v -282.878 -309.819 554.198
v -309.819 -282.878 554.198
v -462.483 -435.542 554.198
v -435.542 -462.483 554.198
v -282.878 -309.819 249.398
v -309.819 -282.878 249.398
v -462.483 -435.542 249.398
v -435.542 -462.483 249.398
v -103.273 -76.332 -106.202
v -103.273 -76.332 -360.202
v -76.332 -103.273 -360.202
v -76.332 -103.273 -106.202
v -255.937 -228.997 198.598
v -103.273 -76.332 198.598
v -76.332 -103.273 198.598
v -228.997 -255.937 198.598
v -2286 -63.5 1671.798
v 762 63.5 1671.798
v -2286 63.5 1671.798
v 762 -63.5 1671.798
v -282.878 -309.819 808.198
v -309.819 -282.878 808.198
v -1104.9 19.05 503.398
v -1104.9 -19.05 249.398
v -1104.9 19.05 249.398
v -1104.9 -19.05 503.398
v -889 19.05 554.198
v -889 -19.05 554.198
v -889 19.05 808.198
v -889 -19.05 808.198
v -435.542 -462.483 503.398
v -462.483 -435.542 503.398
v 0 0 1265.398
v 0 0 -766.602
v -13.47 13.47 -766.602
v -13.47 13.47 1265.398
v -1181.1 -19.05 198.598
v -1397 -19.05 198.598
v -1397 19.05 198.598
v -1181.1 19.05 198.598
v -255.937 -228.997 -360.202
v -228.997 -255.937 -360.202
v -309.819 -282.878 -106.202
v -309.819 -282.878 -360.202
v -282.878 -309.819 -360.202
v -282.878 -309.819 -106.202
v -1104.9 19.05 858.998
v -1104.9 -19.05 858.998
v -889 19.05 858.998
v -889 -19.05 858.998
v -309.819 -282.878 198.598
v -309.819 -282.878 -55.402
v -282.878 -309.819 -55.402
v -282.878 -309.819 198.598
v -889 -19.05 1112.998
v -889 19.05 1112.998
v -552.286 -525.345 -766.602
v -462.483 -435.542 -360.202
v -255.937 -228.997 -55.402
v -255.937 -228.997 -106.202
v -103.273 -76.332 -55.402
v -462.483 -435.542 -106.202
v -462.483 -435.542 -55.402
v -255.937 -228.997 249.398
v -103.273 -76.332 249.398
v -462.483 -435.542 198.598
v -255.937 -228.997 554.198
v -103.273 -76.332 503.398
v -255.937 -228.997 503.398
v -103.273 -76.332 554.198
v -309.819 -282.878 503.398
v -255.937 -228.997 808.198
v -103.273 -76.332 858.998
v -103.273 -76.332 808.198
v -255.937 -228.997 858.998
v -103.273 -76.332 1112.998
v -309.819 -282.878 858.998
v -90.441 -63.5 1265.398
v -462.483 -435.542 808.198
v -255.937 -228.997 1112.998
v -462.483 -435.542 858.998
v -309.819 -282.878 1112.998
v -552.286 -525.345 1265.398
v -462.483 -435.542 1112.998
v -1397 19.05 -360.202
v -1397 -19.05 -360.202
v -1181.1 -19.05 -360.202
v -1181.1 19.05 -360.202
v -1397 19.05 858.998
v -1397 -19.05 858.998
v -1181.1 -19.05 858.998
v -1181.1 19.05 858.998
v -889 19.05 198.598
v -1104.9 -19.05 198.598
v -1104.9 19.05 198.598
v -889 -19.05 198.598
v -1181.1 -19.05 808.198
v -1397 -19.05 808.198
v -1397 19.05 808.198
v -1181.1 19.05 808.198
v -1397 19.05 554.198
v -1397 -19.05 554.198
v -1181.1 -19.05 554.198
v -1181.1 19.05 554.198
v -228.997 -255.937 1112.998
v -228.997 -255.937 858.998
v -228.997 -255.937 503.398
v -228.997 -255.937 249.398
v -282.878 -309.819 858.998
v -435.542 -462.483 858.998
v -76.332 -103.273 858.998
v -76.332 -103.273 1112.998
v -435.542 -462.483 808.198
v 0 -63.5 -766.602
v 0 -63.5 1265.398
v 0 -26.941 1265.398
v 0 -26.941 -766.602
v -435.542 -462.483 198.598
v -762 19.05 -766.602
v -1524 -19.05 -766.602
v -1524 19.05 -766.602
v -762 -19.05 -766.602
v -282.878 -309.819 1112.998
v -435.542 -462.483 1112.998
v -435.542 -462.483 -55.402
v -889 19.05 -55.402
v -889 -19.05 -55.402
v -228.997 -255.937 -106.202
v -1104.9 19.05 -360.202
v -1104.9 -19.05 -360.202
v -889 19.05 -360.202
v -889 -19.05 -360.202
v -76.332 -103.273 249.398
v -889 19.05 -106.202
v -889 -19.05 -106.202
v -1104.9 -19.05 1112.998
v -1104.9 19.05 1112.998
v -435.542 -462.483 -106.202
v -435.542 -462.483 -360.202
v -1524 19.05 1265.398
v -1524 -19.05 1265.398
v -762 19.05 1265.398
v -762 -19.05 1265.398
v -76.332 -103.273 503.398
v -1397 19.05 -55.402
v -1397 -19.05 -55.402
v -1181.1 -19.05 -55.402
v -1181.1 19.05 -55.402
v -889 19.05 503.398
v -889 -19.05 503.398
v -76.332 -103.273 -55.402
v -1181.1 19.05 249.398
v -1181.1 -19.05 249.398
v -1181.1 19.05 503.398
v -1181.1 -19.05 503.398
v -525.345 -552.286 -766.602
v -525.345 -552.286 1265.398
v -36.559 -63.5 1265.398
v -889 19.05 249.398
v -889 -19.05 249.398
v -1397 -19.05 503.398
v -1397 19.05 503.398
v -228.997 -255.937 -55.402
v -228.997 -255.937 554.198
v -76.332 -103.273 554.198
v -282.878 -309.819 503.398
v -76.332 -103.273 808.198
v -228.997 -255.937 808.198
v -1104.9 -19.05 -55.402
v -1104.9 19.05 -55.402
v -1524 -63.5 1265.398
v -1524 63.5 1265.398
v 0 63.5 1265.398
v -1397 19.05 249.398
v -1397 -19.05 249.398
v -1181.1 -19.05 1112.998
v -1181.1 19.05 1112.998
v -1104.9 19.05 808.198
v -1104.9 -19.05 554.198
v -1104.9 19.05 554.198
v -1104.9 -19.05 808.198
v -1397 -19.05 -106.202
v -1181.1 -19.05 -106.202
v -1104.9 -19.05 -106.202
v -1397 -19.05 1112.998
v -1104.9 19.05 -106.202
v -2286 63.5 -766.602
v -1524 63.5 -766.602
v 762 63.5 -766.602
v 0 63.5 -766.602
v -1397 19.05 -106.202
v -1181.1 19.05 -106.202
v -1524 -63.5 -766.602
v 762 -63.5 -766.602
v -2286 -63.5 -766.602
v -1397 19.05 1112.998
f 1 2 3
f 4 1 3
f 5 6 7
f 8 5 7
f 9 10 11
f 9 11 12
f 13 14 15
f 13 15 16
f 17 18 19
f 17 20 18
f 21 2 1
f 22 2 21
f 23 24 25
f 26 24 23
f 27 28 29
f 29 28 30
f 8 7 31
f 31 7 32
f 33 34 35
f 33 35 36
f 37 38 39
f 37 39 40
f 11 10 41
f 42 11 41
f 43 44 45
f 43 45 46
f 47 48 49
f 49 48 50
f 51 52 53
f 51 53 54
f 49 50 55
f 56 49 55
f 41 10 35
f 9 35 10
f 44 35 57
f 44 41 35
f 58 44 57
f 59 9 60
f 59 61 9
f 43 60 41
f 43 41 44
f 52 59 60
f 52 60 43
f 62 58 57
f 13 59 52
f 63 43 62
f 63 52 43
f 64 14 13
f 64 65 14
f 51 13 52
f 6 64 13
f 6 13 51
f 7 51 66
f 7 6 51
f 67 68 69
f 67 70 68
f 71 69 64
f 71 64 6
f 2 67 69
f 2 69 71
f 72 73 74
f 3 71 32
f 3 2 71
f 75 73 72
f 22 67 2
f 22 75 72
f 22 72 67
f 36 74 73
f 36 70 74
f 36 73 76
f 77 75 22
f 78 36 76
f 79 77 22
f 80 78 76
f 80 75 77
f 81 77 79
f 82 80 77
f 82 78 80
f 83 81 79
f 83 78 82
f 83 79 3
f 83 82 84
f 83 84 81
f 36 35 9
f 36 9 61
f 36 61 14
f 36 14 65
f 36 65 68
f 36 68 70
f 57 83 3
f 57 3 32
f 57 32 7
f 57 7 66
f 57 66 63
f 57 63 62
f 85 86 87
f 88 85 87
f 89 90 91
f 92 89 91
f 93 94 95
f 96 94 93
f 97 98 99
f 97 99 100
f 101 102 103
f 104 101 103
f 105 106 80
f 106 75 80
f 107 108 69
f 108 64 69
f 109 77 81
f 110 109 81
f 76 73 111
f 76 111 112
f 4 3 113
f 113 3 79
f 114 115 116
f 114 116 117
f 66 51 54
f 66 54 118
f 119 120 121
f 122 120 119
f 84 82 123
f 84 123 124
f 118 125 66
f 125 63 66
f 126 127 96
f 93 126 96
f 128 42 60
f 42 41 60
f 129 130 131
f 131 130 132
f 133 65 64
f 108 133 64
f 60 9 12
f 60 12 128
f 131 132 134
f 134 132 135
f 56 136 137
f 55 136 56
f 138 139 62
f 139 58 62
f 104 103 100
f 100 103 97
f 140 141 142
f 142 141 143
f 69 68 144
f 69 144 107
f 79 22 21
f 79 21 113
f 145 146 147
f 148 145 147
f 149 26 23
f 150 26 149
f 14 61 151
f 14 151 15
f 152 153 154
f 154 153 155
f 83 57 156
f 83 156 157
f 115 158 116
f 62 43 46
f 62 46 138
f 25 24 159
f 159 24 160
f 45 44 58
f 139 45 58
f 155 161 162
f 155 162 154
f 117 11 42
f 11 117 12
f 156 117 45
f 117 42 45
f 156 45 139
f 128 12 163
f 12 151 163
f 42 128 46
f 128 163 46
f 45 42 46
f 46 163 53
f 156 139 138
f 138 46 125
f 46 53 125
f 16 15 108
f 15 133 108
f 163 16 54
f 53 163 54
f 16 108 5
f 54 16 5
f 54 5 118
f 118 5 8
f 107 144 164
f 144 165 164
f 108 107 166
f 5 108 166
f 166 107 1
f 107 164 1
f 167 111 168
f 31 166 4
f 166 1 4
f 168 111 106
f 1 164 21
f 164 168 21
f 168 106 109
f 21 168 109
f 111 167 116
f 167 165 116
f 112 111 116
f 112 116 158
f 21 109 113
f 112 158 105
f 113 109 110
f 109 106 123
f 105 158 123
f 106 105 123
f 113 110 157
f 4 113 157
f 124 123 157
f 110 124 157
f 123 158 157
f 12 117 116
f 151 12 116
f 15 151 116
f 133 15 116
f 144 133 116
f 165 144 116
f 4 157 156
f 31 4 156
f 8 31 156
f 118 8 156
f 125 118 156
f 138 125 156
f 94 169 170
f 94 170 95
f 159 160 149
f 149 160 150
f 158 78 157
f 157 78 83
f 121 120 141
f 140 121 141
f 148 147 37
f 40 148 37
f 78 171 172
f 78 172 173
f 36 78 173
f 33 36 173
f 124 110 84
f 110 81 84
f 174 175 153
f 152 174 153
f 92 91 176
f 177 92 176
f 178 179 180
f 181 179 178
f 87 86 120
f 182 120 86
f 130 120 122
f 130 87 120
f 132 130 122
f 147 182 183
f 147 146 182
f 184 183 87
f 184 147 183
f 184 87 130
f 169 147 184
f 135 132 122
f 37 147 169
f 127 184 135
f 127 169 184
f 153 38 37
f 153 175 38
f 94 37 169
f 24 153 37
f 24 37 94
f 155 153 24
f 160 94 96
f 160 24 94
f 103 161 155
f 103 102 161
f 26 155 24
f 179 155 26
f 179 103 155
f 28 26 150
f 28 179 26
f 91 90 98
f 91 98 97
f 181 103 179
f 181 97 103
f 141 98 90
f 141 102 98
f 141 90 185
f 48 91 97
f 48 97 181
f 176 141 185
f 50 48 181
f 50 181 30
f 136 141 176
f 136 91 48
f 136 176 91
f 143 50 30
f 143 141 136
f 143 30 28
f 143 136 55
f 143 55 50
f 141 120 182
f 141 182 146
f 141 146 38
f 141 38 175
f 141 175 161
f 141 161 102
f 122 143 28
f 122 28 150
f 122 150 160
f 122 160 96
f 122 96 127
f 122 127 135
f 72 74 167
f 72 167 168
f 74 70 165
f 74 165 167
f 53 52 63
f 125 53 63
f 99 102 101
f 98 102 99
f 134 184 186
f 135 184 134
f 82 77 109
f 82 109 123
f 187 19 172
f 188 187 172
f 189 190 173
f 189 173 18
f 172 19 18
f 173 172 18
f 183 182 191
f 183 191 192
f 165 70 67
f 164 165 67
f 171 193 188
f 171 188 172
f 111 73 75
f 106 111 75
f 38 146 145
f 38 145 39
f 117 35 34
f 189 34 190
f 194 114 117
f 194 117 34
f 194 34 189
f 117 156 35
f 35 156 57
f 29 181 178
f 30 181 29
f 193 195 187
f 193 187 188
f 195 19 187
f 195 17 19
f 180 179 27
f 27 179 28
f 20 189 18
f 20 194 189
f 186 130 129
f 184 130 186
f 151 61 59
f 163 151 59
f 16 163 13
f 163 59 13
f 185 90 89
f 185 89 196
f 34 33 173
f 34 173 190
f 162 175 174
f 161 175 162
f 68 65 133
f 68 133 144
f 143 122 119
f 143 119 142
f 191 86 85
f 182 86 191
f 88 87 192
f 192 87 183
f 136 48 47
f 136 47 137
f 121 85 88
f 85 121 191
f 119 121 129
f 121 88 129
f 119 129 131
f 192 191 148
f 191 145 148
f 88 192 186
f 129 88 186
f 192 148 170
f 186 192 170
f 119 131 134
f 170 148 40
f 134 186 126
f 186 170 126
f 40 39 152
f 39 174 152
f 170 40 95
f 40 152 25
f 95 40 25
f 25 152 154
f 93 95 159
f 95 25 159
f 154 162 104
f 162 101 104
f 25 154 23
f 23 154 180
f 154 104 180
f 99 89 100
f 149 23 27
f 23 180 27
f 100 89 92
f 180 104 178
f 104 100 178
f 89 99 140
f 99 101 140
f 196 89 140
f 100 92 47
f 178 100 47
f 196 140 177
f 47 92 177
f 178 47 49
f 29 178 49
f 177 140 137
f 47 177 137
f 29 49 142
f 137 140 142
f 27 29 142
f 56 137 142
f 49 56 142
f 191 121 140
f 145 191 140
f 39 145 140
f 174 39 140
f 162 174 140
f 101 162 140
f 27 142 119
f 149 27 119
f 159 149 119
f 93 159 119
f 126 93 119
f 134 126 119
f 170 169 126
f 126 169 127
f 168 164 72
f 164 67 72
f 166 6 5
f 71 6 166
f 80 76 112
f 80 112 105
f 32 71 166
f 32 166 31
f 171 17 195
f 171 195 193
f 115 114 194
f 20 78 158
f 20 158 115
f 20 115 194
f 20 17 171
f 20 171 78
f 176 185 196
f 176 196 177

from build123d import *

# Parameters (mm, degrees)
F1_DEPTH      = 63.5
F1_DEPTH_BACK = 63.5
F2_W          = 762
F2_H          = 2032
F3_DEPTH      = 19.05
F3_DEPTH_BACK = 19.05
F6_W          = 215.9
F6_H          = 254
F7_DEPTH      = 82.551
F8_W          = 762
F8_H          = 2032
F8_W_2        = 215.9
F8_H_2        = 254
F9_DEPTH      = 19.05
F9_DEPTH_BACK = 19.05


with BuildPart() as f1:
    # F0 (on Front) → F1 (new body, two sides)
    with BuildSketch(Plane.XZ) as f1_sk:
        Polygon((-2286, 1671.798047), (-2286, -766.601953), (-1524, -766.601953), (-1524, 1265.398047), (0, 1265.398047), (0, -766.601953), (762, -766.601953), (762, 1671.798047), align=None)
    extrude(amount=F1_DEPTH)
    extrude(f1_sk.sketch, amount=-F1_DEPTH_BACK)

    # F8 (on face) → F9 (join, two sides)
    with BuildSketch(Plane(origin=(0, 0, 0), x_dir=(-0.707107, -0.707107, 0), z_dir=(-0.707107, 0.707107, 0))) as f9_sk:
        with Locations((381, 249.398047)):
            Rectangle(F8_W, F8_H)
        with Locations((234.95, -233.201953)):
            Rectangle(F8_W_2, F8_H_2, mode=Mode.SUBTRACT)
        with Locations((234.95, 71.598047)):
            Rectangle(F8_W_2, F8_H_2, mode=Mode.SUBTRACT)
        with Locations((527.05, -233.201953)):
            Rectangle(F8_W_2, F8_H_2, mode=Mode.SUBTRACT)
        with Locations((527.05, 71.598047)):
            Rectangle(F8_W_2, F8_H_2, mode=Mode.SUBTRACT)
        with Locations((234.95, 376.398047)):
            Rectangle(F8_W_2, F8_H_2, mode=Mode.SUBTRACT)
        with Locations((234.95, 681.198047)):
            Rectangle(F8_W_2, F8_H_2, mode=Mode.SUBTRACT)
        with Locations((234.95, 985.998047)):
            Rectangle(F8_W_2, F8_H_2, mode=Mode.SUBTRACT)
        with Locations((527.05, 376.398047)):
            Rectangle(F8_W_2, F8_H_2, mode=Mode.SUBTRACT)
        with Locations((527.05, 681.198047)):
            Rectangle(F8_W_2, F8_H_2, mode=Mode.SUBTRACT)
        with Locations((527.05, 985.998047)):
            Rectangle(F8_W_2, F8_H_2, mode=Mode.SUBTRACT)
    extrude(amount=F9_DEPTH)
    extrude(f9_sk.sketch, amount=-F9_DEPTH_BACK)


with BuildPart() as f3:
    # F2 (on Front) → F3 (new body, two sides)
    with BuildSketch(Plane.XZ) as f3_sk:
        with Locations((-1143, 249.398047)):
            Rectangle(F2_W, F2_H)
    extrude(amount=F3_DEPTH)
    extrude(f3_sk.sketch, amount=-F3_DEPTH_BACK)

    # F6 (on face) → F7 (cut, through all)
    with BuildSketch(Plane.XZ.offset(19.05)):
        with Locations((-1289.05, 985.998047)):
            Rectangle(F6_W, F6_H)
        with Locations((-996.95, 985.998047)):
            Rectangle(F6_W, F6_H)
        with Locations((-1289.05, 681.198047)):
            Rectangle(F6_W, F6_H)
        with Locations((-996.95, 681.198047)):
            Rectangle(F6_W, F6_H)
        with Locations((-1289.05, 376.398047)):
            Rectangle(F6_W, F6_H)
        with Locations((-996.95, 376.398047)):
            Rectangle(F6_W, F6_H)
        with Locations((-1289.05, 71.598047)):
            Rectangle(F6_W, F6_H)
        with Locations((-996.95, 71.598047)):
            Rectangle(F6_W, F6_H)
        with Locations((-1289.05, -233.201953)):
            Rectangle(F6_W, F6_H)
        with Locations((-996.95, -233.201953)):
            Rectangle(F6_W, F6_H)
    extrude(amount=-F7_DEPTH, mode=Mode.SUBTRACT)


solid = Compound([f1.part, f3.part])
